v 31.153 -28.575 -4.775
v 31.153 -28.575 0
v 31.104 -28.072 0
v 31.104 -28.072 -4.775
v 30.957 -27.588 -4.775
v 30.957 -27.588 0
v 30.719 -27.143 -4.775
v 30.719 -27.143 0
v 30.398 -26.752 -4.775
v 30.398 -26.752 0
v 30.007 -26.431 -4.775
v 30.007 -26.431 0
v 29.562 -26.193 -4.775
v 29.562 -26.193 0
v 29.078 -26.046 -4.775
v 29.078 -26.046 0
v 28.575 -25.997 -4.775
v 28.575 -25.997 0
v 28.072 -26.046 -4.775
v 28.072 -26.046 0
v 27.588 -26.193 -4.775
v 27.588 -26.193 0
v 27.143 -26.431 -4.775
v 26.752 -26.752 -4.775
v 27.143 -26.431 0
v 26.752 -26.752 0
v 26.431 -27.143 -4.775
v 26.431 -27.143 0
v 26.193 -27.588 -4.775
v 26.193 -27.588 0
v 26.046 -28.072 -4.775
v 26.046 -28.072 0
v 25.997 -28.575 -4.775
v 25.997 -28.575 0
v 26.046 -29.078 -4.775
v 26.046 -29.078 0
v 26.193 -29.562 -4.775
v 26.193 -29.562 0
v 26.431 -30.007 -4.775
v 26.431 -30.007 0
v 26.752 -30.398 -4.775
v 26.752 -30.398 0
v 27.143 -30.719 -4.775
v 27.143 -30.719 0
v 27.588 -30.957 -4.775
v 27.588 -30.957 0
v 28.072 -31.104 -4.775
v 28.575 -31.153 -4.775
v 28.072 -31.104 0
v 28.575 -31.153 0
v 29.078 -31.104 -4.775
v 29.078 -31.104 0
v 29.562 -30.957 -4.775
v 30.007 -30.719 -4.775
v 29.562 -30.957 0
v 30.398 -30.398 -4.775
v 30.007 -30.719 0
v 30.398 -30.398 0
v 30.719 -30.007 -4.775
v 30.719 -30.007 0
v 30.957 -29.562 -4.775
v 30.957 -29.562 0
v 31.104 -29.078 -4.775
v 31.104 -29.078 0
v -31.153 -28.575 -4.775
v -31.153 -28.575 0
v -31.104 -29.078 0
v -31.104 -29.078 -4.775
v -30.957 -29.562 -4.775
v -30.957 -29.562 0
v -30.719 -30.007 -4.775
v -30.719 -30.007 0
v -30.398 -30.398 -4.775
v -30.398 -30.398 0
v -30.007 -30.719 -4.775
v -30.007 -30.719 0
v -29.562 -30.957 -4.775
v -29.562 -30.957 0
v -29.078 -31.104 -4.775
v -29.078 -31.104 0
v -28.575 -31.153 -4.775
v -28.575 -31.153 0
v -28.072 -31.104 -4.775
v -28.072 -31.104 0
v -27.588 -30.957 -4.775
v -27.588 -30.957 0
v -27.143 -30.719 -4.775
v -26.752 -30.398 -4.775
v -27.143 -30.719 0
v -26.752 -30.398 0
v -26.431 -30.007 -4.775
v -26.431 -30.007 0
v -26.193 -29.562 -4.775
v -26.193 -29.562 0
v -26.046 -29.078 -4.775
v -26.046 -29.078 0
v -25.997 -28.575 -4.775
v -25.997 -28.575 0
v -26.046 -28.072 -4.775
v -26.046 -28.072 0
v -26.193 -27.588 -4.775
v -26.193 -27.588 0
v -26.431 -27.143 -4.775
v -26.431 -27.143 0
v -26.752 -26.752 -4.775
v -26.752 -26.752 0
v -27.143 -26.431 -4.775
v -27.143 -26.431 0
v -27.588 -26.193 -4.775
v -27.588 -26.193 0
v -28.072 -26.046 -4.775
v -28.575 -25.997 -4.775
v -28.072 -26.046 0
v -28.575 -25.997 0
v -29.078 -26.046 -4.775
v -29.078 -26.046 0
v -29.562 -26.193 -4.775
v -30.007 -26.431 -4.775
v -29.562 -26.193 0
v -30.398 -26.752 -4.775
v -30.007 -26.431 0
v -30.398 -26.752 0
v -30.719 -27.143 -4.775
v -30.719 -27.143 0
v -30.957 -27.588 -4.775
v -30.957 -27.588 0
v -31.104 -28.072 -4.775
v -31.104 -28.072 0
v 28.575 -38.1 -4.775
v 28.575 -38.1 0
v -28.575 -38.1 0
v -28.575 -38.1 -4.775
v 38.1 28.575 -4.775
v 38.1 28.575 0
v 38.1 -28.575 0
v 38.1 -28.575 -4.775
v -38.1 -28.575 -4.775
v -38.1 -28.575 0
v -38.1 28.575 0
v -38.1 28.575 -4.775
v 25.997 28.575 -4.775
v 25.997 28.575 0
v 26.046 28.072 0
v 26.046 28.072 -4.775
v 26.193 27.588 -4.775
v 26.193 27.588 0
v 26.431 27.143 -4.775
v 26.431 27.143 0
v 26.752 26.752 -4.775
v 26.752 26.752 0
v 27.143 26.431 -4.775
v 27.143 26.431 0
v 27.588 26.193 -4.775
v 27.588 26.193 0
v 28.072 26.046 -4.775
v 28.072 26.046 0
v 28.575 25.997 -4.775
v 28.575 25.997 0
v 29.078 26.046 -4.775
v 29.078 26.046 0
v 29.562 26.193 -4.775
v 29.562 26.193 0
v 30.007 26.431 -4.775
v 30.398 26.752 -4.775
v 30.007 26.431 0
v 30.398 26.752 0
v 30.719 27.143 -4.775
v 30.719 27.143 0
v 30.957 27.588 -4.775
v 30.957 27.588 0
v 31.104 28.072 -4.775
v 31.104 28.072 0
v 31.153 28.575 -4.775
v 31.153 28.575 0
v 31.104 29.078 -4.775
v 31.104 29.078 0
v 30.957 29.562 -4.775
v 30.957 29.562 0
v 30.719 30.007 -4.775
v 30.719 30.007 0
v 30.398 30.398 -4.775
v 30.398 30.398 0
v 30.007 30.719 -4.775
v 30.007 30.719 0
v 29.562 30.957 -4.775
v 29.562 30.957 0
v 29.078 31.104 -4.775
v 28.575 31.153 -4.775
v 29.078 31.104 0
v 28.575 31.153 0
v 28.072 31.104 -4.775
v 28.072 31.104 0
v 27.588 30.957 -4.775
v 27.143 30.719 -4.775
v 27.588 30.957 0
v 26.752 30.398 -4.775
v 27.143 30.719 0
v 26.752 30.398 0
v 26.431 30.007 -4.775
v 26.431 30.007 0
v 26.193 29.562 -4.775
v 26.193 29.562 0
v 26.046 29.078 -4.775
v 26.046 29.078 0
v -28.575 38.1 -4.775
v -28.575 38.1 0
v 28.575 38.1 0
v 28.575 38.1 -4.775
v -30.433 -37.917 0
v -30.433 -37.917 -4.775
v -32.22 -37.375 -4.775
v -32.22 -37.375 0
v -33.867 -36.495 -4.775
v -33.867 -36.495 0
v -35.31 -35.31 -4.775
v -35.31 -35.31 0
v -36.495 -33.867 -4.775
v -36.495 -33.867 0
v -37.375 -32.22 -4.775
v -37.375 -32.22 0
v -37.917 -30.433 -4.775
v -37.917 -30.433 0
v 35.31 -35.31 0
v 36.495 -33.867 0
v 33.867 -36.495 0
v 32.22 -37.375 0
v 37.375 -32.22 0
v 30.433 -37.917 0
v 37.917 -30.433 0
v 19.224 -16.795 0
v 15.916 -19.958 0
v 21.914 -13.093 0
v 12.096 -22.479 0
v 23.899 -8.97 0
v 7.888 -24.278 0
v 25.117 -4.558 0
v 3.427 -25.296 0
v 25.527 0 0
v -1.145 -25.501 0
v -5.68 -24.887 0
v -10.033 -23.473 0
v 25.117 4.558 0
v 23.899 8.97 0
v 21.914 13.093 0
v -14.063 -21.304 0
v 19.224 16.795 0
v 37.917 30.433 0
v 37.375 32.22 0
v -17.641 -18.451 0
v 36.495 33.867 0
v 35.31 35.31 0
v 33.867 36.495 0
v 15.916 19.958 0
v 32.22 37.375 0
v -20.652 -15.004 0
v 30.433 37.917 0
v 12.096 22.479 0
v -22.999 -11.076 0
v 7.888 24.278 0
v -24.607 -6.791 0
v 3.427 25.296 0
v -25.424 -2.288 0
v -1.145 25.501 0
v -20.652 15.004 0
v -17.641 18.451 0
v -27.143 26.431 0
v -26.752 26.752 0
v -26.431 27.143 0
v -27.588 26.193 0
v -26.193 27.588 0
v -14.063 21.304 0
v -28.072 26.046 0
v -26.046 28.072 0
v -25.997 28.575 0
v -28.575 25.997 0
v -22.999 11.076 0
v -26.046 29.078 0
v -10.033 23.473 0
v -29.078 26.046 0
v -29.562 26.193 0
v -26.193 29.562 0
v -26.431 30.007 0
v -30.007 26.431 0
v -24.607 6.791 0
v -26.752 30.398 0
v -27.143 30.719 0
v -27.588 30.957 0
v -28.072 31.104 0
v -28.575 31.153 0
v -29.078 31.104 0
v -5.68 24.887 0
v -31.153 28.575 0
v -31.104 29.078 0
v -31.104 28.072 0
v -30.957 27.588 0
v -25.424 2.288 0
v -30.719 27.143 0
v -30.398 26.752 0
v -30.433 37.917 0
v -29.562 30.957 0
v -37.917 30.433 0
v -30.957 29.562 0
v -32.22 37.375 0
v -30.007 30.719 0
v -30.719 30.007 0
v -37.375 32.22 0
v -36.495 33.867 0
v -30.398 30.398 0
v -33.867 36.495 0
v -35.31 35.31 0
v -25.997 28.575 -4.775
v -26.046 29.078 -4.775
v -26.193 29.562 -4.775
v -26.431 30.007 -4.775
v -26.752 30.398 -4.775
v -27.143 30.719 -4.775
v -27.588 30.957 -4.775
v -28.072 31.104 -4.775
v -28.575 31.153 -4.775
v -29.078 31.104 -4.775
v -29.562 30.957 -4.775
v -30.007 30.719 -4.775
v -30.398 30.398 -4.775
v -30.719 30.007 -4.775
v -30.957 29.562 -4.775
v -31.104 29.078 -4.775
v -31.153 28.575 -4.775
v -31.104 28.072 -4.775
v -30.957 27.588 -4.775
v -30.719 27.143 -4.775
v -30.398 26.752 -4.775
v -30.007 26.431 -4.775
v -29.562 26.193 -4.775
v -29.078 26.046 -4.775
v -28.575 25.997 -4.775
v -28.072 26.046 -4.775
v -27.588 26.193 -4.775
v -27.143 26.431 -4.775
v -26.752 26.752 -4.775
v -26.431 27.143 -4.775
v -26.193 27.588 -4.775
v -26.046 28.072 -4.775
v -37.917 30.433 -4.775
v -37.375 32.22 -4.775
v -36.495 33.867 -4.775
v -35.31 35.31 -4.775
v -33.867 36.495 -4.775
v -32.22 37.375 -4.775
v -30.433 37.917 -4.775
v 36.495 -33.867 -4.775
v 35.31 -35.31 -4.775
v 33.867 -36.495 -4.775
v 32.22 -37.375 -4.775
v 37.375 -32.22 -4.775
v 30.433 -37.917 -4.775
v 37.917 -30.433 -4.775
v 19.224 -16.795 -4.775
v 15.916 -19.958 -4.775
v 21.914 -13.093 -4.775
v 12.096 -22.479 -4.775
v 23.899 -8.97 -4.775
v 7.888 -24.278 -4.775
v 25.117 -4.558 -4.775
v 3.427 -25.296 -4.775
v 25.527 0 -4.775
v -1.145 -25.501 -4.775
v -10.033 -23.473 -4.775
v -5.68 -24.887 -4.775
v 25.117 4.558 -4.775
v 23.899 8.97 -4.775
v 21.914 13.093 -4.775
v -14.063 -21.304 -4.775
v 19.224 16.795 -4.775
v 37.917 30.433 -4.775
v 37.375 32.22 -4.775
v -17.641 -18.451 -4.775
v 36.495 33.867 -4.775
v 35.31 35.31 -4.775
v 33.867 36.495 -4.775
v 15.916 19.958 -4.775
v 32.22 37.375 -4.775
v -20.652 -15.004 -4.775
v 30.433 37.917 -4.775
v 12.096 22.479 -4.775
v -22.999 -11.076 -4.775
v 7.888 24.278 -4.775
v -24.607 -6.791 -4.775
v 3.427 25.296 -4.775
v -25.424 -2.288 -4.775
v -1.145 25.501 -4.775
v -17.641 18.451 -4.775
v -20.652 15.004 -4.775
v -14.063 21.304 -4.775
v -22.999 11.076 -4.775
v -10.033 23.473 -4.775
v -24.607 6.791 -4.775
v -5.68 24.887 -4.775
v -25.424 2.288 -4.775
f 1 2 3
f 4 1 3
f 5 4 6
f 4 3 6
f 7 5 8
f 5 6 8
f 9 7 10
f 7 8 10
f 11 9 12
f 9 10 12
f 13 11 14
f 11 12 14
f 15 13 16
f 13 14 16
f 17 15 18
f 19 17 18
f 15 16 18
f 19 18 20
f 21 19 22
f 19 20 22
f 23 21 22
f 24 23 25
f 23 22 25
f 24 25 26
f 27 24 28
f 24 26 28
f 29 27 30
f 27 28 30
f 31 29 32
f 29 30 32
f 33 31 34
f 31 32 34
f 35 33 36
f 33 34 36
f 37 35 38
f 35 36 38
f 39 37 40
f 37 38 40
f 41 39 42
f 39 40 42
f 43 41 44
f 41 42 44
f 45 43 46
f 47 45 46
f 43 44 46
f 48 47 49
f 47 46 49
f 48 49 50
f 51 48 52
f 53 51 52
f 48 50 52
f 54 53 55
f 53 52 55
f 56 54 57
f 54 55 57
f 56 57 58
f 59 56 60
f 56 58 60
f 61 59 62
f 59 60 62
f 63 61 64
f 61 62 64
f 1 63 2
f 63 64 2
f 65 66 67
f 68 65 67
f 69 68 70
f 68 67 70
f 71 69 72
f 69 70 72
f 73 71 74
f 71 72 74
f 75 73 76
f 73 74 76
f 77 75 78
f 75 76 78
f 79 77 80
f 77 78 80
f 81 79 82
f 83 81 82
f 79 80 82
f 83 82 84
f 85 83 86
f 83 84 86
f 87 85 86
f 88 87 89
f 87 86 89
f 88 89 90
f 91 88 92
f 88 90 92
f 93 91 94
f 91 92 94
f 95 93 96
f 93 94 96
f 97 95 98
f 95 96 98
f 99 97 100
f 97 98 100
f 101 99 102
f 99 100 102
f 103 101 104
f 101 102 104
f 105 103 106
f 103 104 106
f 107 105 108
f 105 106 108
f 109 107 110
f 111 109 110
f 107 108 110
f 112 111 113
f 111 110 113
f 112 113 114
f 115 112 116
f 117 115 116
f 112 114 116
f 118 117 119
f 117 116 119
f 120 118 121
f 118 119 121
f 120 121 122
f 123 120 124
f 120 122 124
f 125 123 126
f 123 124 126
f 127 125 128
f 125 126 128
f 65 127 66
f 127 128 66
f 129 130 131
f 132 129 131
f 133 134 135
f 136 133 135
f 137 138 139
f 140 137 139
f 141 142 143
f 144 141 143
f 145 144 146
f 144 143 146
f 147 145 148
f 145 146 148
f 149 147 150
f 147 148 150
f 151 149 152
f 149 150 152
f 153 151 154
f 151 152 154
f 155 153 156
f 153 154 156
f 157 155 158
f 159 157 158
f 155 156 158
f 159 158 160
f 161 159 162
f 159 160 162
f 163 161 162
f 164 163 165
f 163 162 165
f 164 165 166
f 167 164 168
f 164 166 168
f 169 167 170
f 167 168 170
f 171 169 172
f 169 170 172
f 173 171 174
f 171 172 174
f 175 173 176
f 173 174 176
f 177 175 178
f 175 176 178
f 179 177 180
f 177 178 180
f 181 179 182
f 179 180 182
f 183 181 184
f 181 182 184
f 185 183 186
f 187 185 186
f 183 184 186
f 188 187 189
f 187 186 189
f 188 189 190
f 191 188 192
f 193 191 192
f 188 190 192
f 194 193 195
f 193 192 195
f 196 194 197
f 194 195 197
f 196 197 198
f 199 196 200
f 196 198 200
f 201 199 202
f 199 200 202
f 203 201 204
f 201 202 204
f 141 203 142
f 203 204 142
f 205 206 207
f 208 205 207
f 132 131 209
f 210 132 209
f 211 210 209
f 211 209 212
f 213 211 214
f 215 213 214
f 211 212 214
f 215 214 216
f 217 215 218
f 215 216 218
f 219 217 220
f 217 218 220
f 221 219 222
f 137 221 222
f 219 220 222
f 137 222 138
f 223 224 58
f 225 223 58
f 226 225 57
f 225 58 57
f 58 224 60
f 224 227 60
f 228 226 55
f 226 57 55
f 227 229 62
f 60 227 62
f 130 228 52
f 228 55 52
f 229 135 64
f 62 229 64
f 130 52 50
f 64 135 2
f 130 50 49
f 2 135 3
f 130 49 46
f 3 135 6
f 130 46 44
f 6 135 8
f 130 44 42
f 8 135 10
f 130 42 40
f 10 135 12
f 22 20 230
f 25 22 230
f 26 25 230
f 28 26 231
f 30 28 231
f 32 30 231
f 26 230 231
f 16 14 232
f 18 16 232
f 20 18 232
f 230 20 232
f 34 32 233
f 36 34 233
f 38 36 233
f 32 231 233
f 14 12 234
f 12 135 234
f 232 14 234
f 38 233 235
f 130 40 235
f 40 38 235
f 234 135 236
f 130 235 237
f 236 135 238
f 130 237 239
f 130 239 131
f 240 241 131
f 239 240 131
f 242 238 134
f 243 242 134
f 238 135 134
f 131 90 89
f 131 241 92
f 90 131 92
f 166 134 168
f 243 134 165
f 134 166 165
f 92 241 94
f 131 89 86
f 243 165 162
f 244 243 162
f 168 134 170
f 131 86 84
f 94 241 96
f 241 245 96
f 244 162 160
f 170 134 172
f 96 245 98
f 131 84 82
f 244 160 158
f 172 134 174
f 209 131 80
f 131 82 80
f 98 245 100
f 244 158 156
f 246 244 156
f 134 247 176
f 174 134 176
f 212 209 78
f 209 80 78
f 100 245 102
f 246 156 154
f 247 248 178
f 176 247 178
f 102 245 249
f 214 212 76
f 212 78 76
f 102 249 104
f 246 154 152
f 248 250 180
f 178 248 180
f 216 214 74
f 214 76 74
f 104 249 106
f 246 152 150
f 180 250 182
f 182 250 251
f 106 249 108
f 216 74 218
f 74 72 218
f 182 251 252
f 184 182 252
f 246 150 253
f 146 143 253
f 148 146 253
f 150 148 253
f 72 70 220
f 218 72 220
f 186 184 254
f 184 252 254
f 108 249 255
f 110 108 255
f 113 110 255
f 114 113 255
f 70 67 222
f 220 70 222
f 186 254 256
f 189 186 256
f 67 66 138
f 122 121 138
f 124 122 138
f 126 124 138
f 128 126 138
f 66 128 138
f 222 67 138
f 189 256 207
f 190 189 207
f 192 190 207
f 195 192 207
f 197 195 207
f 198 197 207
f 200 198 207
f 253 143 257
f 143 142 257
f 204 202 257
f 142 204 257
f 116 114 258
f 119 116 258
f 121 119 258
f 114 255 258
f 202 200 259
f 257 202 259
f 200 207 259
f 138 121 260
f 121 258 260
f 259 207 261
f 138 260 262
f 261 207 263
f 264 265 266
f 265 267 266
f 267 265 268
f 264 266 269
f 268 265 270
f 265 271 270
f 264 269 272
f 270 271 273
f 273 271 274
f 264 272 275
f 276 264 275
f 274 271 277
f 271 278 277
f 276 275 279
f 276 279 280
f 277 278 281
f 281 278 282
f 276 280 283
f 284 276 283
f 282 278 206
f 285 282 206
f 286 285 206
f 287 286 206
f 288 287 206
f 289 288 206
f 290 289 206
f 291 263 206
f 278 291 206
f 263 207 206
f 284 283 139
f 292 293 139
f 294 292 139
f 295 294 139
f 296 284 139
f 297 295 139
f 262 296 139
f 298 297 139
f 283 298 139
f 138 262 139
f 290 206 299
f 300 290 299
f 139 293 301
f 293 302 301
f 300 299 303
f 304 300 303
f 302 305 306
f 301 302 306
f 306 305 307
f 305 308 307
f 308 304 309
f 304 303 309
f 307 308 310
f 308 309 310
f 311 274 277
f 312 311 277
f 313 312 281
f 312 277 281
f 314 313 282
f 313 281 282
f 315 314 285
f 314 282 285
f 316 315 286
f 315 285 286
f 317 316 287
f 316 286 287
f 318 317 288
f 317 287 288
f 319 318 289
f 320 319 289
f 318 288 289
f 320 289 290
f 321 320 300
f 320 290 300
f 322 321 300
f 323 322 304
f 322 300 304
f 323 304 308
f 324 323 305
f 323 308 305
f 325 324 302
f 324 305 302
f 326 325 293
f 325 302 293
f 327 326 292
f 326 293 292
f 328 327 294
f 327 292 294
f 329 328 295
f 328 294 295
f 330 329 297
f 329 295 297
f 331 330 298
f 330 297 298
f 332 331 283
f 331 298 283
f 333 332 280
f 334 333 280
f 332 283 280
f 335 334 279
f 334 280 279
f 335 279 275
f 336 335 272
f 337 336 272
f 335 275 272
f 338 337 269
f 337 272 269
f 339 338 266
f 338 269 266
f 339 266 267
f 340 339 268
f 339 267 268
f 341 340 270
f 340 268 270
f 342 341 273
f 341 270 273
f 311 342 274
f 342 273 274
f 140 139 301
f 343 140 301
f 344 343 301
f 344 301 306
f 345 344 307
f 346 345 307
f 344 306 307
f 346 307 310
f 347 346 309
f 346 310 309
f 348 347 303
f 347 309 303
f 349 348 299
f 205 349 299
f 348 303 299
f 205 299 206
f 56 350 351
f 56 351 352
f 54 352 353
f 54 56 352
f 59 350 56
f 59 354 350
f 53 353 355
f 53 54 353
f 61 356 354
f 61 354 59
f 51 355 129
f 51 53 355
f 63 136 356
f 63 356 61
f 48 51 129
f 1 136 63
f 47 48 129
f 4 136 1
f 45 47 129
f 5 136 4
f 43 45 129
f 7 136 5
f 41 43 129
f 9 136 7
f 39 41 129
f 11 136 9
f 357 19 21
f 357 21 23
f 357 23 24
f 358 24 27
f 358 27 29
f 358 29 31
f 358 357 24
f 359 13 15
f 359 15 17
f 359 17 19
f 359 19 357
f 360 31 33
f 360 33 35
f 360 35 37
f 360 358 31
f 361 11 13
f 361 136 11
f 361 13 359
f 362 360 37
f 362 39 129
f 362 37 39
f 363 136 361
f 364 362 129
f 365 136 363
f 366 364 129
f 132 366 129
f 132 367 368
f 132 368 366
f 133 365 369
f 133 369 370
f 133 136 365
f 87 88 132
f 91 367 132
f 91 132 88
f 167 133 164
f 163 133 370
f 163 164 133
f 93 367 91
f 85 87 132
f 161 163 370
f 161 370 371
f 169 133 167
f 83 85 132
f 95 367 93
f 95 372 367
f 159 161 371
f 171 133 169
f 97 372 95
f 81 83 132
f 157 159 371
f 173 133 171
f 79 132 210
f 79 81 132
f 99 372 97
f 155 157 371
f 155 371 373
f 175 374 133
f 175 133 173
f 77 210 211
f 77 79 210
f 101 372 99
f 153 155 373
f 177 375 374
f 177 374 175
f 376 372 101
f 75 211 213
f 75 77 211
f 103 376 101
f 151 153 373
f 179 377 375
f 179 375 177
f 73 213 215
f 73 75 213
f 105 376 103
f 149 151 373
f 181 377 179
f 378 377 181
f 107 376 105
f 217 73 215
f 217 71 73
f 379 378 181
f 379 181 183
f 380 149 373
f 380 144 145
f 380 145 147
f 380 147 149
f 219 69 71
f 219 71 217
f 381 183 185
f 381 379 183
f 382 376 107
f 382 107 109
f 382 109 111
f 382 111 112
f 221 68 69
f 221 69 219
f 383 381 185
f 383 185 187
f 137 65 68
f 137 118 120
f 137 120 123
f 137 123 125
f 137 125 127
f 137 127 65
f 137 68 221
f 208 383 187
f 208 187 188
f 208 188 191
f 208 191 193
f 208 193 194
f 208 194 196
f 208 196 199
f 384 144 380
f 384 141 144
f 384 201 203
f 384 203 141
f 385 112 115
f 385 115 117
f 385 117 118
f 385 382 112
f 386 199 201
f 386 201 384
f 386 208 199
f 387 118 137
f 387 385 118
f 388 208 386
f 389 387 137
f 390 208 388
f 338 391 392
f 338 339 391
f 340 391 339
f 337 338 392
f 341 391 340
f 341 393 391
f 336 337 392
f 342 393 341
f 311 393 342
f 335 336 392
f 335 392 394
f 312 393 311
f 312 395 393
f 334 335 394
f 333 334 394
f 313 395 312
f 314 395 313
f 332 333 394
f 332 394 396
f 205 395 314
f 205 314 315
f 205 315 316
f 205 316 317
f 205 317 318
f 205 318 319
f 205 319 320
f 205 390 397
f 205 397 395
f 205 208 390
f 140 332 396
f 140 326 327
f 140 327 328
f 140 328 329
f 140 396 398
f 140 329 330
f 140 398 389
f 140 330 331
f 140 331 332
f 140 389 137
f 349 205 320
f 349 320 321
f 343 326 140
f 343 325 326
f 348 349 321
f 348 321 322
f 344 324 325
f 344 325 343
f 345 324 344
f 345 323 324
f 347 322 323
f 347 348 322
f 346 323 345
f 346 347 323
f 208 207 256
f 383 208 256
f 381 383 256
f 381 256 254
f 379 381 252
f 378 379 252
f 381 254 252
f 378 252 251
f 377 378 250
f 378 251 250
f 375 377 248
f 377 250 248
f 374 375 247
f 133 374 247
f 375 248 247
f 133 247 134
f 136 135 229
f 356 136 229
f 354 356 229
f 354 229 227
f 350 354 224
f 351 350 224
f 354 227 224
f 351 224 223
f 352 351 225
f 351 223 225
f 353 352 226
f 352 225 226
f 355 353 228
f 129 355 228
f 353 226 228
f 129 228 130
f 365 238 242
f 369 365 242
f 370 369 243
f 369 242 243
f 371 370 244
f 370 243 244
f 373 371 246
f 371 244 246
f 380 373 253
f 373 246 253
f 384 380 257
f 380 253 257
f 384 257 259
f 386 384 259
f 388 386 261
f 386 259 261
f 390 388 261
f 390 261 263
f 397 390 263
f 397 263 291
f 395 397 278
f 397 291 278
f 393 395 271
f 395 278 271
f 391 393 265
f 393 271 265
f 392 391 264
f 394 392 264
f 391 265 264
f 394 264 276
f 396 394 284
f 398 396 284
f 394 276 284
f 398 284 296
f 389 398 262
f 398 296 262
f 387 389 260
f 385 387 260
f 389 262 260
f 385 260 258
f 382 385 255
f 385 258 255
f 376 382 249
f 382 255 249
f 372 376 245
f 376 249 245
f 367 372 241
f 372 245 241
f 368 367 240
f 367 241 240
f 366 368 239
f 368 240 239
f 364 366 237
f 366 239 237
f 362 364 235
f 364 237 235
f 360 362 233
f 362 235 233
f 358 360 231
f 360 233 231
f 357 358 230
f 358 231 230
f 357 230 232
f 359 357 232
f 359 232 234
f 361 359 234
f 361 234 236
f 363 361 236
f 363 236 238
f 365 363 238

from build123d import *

# Parameters (mm, degrees)
SKETCH1_R      = 25.527
SKETCH1_R_2    = 2.5781
EXTRUDE1_DEPTH = 4.7752


with BuildPart() as part:
    # Sketch1 → Extrude1 (new body)
    with BuildSketch(Plane.XY):
        with BuildLine():
            Line((-28.575, 38.1), (28.575, 38.1))
            ThreePointArc((28.575, 38.1), (35.310192091, 35.310192091), (38.1, 28.575))
            Line((38.1, 28.575), (38.1, -28.575))
            ThreePointArc((38.1, -28.575), (35.310192091, -35.310192091), (28.575, -38.1))
            Line((28.575, -38.1), (-28.575, -38.1))
            ThreePointArc((-28.575, -38.1), (-35.310192091, -35.310192091), (-38.1, -28.575))
            Line((-38.1, -28.575), (-38.1, 28.575))
            ThreePointArc((-38.1, 28.575), (-35.310192091, 35.310192091), (-28.575, 38.1))
        make_face()
        Circle(SKETCH1_R, mode=Mode.SUBTRACT)
        with Locations((-28.575, 28.575)):
            Circle(SKETCH1_R_2, mode=Mode.SUBTRACT)
        with Locations(Location((28.575, 28.575, 0), (0, 0, 180))):
            Circle(SKETCH1_R_2, mode=Mode.SUBTRACT)
        with Locations(Location((-28.575, -28.575, 0), (0, 0, 180))):
            Circle(SKETCH1_R_2, mode=Mode.SUBTRACT)
        with Locations((28.575, -28.575)):
            Circle(SKETCH1_R_2, mode=Mode.SUBTRACT)
    extrude(amount=-EXTRUDE1_DEPTH)


solid = part.part
